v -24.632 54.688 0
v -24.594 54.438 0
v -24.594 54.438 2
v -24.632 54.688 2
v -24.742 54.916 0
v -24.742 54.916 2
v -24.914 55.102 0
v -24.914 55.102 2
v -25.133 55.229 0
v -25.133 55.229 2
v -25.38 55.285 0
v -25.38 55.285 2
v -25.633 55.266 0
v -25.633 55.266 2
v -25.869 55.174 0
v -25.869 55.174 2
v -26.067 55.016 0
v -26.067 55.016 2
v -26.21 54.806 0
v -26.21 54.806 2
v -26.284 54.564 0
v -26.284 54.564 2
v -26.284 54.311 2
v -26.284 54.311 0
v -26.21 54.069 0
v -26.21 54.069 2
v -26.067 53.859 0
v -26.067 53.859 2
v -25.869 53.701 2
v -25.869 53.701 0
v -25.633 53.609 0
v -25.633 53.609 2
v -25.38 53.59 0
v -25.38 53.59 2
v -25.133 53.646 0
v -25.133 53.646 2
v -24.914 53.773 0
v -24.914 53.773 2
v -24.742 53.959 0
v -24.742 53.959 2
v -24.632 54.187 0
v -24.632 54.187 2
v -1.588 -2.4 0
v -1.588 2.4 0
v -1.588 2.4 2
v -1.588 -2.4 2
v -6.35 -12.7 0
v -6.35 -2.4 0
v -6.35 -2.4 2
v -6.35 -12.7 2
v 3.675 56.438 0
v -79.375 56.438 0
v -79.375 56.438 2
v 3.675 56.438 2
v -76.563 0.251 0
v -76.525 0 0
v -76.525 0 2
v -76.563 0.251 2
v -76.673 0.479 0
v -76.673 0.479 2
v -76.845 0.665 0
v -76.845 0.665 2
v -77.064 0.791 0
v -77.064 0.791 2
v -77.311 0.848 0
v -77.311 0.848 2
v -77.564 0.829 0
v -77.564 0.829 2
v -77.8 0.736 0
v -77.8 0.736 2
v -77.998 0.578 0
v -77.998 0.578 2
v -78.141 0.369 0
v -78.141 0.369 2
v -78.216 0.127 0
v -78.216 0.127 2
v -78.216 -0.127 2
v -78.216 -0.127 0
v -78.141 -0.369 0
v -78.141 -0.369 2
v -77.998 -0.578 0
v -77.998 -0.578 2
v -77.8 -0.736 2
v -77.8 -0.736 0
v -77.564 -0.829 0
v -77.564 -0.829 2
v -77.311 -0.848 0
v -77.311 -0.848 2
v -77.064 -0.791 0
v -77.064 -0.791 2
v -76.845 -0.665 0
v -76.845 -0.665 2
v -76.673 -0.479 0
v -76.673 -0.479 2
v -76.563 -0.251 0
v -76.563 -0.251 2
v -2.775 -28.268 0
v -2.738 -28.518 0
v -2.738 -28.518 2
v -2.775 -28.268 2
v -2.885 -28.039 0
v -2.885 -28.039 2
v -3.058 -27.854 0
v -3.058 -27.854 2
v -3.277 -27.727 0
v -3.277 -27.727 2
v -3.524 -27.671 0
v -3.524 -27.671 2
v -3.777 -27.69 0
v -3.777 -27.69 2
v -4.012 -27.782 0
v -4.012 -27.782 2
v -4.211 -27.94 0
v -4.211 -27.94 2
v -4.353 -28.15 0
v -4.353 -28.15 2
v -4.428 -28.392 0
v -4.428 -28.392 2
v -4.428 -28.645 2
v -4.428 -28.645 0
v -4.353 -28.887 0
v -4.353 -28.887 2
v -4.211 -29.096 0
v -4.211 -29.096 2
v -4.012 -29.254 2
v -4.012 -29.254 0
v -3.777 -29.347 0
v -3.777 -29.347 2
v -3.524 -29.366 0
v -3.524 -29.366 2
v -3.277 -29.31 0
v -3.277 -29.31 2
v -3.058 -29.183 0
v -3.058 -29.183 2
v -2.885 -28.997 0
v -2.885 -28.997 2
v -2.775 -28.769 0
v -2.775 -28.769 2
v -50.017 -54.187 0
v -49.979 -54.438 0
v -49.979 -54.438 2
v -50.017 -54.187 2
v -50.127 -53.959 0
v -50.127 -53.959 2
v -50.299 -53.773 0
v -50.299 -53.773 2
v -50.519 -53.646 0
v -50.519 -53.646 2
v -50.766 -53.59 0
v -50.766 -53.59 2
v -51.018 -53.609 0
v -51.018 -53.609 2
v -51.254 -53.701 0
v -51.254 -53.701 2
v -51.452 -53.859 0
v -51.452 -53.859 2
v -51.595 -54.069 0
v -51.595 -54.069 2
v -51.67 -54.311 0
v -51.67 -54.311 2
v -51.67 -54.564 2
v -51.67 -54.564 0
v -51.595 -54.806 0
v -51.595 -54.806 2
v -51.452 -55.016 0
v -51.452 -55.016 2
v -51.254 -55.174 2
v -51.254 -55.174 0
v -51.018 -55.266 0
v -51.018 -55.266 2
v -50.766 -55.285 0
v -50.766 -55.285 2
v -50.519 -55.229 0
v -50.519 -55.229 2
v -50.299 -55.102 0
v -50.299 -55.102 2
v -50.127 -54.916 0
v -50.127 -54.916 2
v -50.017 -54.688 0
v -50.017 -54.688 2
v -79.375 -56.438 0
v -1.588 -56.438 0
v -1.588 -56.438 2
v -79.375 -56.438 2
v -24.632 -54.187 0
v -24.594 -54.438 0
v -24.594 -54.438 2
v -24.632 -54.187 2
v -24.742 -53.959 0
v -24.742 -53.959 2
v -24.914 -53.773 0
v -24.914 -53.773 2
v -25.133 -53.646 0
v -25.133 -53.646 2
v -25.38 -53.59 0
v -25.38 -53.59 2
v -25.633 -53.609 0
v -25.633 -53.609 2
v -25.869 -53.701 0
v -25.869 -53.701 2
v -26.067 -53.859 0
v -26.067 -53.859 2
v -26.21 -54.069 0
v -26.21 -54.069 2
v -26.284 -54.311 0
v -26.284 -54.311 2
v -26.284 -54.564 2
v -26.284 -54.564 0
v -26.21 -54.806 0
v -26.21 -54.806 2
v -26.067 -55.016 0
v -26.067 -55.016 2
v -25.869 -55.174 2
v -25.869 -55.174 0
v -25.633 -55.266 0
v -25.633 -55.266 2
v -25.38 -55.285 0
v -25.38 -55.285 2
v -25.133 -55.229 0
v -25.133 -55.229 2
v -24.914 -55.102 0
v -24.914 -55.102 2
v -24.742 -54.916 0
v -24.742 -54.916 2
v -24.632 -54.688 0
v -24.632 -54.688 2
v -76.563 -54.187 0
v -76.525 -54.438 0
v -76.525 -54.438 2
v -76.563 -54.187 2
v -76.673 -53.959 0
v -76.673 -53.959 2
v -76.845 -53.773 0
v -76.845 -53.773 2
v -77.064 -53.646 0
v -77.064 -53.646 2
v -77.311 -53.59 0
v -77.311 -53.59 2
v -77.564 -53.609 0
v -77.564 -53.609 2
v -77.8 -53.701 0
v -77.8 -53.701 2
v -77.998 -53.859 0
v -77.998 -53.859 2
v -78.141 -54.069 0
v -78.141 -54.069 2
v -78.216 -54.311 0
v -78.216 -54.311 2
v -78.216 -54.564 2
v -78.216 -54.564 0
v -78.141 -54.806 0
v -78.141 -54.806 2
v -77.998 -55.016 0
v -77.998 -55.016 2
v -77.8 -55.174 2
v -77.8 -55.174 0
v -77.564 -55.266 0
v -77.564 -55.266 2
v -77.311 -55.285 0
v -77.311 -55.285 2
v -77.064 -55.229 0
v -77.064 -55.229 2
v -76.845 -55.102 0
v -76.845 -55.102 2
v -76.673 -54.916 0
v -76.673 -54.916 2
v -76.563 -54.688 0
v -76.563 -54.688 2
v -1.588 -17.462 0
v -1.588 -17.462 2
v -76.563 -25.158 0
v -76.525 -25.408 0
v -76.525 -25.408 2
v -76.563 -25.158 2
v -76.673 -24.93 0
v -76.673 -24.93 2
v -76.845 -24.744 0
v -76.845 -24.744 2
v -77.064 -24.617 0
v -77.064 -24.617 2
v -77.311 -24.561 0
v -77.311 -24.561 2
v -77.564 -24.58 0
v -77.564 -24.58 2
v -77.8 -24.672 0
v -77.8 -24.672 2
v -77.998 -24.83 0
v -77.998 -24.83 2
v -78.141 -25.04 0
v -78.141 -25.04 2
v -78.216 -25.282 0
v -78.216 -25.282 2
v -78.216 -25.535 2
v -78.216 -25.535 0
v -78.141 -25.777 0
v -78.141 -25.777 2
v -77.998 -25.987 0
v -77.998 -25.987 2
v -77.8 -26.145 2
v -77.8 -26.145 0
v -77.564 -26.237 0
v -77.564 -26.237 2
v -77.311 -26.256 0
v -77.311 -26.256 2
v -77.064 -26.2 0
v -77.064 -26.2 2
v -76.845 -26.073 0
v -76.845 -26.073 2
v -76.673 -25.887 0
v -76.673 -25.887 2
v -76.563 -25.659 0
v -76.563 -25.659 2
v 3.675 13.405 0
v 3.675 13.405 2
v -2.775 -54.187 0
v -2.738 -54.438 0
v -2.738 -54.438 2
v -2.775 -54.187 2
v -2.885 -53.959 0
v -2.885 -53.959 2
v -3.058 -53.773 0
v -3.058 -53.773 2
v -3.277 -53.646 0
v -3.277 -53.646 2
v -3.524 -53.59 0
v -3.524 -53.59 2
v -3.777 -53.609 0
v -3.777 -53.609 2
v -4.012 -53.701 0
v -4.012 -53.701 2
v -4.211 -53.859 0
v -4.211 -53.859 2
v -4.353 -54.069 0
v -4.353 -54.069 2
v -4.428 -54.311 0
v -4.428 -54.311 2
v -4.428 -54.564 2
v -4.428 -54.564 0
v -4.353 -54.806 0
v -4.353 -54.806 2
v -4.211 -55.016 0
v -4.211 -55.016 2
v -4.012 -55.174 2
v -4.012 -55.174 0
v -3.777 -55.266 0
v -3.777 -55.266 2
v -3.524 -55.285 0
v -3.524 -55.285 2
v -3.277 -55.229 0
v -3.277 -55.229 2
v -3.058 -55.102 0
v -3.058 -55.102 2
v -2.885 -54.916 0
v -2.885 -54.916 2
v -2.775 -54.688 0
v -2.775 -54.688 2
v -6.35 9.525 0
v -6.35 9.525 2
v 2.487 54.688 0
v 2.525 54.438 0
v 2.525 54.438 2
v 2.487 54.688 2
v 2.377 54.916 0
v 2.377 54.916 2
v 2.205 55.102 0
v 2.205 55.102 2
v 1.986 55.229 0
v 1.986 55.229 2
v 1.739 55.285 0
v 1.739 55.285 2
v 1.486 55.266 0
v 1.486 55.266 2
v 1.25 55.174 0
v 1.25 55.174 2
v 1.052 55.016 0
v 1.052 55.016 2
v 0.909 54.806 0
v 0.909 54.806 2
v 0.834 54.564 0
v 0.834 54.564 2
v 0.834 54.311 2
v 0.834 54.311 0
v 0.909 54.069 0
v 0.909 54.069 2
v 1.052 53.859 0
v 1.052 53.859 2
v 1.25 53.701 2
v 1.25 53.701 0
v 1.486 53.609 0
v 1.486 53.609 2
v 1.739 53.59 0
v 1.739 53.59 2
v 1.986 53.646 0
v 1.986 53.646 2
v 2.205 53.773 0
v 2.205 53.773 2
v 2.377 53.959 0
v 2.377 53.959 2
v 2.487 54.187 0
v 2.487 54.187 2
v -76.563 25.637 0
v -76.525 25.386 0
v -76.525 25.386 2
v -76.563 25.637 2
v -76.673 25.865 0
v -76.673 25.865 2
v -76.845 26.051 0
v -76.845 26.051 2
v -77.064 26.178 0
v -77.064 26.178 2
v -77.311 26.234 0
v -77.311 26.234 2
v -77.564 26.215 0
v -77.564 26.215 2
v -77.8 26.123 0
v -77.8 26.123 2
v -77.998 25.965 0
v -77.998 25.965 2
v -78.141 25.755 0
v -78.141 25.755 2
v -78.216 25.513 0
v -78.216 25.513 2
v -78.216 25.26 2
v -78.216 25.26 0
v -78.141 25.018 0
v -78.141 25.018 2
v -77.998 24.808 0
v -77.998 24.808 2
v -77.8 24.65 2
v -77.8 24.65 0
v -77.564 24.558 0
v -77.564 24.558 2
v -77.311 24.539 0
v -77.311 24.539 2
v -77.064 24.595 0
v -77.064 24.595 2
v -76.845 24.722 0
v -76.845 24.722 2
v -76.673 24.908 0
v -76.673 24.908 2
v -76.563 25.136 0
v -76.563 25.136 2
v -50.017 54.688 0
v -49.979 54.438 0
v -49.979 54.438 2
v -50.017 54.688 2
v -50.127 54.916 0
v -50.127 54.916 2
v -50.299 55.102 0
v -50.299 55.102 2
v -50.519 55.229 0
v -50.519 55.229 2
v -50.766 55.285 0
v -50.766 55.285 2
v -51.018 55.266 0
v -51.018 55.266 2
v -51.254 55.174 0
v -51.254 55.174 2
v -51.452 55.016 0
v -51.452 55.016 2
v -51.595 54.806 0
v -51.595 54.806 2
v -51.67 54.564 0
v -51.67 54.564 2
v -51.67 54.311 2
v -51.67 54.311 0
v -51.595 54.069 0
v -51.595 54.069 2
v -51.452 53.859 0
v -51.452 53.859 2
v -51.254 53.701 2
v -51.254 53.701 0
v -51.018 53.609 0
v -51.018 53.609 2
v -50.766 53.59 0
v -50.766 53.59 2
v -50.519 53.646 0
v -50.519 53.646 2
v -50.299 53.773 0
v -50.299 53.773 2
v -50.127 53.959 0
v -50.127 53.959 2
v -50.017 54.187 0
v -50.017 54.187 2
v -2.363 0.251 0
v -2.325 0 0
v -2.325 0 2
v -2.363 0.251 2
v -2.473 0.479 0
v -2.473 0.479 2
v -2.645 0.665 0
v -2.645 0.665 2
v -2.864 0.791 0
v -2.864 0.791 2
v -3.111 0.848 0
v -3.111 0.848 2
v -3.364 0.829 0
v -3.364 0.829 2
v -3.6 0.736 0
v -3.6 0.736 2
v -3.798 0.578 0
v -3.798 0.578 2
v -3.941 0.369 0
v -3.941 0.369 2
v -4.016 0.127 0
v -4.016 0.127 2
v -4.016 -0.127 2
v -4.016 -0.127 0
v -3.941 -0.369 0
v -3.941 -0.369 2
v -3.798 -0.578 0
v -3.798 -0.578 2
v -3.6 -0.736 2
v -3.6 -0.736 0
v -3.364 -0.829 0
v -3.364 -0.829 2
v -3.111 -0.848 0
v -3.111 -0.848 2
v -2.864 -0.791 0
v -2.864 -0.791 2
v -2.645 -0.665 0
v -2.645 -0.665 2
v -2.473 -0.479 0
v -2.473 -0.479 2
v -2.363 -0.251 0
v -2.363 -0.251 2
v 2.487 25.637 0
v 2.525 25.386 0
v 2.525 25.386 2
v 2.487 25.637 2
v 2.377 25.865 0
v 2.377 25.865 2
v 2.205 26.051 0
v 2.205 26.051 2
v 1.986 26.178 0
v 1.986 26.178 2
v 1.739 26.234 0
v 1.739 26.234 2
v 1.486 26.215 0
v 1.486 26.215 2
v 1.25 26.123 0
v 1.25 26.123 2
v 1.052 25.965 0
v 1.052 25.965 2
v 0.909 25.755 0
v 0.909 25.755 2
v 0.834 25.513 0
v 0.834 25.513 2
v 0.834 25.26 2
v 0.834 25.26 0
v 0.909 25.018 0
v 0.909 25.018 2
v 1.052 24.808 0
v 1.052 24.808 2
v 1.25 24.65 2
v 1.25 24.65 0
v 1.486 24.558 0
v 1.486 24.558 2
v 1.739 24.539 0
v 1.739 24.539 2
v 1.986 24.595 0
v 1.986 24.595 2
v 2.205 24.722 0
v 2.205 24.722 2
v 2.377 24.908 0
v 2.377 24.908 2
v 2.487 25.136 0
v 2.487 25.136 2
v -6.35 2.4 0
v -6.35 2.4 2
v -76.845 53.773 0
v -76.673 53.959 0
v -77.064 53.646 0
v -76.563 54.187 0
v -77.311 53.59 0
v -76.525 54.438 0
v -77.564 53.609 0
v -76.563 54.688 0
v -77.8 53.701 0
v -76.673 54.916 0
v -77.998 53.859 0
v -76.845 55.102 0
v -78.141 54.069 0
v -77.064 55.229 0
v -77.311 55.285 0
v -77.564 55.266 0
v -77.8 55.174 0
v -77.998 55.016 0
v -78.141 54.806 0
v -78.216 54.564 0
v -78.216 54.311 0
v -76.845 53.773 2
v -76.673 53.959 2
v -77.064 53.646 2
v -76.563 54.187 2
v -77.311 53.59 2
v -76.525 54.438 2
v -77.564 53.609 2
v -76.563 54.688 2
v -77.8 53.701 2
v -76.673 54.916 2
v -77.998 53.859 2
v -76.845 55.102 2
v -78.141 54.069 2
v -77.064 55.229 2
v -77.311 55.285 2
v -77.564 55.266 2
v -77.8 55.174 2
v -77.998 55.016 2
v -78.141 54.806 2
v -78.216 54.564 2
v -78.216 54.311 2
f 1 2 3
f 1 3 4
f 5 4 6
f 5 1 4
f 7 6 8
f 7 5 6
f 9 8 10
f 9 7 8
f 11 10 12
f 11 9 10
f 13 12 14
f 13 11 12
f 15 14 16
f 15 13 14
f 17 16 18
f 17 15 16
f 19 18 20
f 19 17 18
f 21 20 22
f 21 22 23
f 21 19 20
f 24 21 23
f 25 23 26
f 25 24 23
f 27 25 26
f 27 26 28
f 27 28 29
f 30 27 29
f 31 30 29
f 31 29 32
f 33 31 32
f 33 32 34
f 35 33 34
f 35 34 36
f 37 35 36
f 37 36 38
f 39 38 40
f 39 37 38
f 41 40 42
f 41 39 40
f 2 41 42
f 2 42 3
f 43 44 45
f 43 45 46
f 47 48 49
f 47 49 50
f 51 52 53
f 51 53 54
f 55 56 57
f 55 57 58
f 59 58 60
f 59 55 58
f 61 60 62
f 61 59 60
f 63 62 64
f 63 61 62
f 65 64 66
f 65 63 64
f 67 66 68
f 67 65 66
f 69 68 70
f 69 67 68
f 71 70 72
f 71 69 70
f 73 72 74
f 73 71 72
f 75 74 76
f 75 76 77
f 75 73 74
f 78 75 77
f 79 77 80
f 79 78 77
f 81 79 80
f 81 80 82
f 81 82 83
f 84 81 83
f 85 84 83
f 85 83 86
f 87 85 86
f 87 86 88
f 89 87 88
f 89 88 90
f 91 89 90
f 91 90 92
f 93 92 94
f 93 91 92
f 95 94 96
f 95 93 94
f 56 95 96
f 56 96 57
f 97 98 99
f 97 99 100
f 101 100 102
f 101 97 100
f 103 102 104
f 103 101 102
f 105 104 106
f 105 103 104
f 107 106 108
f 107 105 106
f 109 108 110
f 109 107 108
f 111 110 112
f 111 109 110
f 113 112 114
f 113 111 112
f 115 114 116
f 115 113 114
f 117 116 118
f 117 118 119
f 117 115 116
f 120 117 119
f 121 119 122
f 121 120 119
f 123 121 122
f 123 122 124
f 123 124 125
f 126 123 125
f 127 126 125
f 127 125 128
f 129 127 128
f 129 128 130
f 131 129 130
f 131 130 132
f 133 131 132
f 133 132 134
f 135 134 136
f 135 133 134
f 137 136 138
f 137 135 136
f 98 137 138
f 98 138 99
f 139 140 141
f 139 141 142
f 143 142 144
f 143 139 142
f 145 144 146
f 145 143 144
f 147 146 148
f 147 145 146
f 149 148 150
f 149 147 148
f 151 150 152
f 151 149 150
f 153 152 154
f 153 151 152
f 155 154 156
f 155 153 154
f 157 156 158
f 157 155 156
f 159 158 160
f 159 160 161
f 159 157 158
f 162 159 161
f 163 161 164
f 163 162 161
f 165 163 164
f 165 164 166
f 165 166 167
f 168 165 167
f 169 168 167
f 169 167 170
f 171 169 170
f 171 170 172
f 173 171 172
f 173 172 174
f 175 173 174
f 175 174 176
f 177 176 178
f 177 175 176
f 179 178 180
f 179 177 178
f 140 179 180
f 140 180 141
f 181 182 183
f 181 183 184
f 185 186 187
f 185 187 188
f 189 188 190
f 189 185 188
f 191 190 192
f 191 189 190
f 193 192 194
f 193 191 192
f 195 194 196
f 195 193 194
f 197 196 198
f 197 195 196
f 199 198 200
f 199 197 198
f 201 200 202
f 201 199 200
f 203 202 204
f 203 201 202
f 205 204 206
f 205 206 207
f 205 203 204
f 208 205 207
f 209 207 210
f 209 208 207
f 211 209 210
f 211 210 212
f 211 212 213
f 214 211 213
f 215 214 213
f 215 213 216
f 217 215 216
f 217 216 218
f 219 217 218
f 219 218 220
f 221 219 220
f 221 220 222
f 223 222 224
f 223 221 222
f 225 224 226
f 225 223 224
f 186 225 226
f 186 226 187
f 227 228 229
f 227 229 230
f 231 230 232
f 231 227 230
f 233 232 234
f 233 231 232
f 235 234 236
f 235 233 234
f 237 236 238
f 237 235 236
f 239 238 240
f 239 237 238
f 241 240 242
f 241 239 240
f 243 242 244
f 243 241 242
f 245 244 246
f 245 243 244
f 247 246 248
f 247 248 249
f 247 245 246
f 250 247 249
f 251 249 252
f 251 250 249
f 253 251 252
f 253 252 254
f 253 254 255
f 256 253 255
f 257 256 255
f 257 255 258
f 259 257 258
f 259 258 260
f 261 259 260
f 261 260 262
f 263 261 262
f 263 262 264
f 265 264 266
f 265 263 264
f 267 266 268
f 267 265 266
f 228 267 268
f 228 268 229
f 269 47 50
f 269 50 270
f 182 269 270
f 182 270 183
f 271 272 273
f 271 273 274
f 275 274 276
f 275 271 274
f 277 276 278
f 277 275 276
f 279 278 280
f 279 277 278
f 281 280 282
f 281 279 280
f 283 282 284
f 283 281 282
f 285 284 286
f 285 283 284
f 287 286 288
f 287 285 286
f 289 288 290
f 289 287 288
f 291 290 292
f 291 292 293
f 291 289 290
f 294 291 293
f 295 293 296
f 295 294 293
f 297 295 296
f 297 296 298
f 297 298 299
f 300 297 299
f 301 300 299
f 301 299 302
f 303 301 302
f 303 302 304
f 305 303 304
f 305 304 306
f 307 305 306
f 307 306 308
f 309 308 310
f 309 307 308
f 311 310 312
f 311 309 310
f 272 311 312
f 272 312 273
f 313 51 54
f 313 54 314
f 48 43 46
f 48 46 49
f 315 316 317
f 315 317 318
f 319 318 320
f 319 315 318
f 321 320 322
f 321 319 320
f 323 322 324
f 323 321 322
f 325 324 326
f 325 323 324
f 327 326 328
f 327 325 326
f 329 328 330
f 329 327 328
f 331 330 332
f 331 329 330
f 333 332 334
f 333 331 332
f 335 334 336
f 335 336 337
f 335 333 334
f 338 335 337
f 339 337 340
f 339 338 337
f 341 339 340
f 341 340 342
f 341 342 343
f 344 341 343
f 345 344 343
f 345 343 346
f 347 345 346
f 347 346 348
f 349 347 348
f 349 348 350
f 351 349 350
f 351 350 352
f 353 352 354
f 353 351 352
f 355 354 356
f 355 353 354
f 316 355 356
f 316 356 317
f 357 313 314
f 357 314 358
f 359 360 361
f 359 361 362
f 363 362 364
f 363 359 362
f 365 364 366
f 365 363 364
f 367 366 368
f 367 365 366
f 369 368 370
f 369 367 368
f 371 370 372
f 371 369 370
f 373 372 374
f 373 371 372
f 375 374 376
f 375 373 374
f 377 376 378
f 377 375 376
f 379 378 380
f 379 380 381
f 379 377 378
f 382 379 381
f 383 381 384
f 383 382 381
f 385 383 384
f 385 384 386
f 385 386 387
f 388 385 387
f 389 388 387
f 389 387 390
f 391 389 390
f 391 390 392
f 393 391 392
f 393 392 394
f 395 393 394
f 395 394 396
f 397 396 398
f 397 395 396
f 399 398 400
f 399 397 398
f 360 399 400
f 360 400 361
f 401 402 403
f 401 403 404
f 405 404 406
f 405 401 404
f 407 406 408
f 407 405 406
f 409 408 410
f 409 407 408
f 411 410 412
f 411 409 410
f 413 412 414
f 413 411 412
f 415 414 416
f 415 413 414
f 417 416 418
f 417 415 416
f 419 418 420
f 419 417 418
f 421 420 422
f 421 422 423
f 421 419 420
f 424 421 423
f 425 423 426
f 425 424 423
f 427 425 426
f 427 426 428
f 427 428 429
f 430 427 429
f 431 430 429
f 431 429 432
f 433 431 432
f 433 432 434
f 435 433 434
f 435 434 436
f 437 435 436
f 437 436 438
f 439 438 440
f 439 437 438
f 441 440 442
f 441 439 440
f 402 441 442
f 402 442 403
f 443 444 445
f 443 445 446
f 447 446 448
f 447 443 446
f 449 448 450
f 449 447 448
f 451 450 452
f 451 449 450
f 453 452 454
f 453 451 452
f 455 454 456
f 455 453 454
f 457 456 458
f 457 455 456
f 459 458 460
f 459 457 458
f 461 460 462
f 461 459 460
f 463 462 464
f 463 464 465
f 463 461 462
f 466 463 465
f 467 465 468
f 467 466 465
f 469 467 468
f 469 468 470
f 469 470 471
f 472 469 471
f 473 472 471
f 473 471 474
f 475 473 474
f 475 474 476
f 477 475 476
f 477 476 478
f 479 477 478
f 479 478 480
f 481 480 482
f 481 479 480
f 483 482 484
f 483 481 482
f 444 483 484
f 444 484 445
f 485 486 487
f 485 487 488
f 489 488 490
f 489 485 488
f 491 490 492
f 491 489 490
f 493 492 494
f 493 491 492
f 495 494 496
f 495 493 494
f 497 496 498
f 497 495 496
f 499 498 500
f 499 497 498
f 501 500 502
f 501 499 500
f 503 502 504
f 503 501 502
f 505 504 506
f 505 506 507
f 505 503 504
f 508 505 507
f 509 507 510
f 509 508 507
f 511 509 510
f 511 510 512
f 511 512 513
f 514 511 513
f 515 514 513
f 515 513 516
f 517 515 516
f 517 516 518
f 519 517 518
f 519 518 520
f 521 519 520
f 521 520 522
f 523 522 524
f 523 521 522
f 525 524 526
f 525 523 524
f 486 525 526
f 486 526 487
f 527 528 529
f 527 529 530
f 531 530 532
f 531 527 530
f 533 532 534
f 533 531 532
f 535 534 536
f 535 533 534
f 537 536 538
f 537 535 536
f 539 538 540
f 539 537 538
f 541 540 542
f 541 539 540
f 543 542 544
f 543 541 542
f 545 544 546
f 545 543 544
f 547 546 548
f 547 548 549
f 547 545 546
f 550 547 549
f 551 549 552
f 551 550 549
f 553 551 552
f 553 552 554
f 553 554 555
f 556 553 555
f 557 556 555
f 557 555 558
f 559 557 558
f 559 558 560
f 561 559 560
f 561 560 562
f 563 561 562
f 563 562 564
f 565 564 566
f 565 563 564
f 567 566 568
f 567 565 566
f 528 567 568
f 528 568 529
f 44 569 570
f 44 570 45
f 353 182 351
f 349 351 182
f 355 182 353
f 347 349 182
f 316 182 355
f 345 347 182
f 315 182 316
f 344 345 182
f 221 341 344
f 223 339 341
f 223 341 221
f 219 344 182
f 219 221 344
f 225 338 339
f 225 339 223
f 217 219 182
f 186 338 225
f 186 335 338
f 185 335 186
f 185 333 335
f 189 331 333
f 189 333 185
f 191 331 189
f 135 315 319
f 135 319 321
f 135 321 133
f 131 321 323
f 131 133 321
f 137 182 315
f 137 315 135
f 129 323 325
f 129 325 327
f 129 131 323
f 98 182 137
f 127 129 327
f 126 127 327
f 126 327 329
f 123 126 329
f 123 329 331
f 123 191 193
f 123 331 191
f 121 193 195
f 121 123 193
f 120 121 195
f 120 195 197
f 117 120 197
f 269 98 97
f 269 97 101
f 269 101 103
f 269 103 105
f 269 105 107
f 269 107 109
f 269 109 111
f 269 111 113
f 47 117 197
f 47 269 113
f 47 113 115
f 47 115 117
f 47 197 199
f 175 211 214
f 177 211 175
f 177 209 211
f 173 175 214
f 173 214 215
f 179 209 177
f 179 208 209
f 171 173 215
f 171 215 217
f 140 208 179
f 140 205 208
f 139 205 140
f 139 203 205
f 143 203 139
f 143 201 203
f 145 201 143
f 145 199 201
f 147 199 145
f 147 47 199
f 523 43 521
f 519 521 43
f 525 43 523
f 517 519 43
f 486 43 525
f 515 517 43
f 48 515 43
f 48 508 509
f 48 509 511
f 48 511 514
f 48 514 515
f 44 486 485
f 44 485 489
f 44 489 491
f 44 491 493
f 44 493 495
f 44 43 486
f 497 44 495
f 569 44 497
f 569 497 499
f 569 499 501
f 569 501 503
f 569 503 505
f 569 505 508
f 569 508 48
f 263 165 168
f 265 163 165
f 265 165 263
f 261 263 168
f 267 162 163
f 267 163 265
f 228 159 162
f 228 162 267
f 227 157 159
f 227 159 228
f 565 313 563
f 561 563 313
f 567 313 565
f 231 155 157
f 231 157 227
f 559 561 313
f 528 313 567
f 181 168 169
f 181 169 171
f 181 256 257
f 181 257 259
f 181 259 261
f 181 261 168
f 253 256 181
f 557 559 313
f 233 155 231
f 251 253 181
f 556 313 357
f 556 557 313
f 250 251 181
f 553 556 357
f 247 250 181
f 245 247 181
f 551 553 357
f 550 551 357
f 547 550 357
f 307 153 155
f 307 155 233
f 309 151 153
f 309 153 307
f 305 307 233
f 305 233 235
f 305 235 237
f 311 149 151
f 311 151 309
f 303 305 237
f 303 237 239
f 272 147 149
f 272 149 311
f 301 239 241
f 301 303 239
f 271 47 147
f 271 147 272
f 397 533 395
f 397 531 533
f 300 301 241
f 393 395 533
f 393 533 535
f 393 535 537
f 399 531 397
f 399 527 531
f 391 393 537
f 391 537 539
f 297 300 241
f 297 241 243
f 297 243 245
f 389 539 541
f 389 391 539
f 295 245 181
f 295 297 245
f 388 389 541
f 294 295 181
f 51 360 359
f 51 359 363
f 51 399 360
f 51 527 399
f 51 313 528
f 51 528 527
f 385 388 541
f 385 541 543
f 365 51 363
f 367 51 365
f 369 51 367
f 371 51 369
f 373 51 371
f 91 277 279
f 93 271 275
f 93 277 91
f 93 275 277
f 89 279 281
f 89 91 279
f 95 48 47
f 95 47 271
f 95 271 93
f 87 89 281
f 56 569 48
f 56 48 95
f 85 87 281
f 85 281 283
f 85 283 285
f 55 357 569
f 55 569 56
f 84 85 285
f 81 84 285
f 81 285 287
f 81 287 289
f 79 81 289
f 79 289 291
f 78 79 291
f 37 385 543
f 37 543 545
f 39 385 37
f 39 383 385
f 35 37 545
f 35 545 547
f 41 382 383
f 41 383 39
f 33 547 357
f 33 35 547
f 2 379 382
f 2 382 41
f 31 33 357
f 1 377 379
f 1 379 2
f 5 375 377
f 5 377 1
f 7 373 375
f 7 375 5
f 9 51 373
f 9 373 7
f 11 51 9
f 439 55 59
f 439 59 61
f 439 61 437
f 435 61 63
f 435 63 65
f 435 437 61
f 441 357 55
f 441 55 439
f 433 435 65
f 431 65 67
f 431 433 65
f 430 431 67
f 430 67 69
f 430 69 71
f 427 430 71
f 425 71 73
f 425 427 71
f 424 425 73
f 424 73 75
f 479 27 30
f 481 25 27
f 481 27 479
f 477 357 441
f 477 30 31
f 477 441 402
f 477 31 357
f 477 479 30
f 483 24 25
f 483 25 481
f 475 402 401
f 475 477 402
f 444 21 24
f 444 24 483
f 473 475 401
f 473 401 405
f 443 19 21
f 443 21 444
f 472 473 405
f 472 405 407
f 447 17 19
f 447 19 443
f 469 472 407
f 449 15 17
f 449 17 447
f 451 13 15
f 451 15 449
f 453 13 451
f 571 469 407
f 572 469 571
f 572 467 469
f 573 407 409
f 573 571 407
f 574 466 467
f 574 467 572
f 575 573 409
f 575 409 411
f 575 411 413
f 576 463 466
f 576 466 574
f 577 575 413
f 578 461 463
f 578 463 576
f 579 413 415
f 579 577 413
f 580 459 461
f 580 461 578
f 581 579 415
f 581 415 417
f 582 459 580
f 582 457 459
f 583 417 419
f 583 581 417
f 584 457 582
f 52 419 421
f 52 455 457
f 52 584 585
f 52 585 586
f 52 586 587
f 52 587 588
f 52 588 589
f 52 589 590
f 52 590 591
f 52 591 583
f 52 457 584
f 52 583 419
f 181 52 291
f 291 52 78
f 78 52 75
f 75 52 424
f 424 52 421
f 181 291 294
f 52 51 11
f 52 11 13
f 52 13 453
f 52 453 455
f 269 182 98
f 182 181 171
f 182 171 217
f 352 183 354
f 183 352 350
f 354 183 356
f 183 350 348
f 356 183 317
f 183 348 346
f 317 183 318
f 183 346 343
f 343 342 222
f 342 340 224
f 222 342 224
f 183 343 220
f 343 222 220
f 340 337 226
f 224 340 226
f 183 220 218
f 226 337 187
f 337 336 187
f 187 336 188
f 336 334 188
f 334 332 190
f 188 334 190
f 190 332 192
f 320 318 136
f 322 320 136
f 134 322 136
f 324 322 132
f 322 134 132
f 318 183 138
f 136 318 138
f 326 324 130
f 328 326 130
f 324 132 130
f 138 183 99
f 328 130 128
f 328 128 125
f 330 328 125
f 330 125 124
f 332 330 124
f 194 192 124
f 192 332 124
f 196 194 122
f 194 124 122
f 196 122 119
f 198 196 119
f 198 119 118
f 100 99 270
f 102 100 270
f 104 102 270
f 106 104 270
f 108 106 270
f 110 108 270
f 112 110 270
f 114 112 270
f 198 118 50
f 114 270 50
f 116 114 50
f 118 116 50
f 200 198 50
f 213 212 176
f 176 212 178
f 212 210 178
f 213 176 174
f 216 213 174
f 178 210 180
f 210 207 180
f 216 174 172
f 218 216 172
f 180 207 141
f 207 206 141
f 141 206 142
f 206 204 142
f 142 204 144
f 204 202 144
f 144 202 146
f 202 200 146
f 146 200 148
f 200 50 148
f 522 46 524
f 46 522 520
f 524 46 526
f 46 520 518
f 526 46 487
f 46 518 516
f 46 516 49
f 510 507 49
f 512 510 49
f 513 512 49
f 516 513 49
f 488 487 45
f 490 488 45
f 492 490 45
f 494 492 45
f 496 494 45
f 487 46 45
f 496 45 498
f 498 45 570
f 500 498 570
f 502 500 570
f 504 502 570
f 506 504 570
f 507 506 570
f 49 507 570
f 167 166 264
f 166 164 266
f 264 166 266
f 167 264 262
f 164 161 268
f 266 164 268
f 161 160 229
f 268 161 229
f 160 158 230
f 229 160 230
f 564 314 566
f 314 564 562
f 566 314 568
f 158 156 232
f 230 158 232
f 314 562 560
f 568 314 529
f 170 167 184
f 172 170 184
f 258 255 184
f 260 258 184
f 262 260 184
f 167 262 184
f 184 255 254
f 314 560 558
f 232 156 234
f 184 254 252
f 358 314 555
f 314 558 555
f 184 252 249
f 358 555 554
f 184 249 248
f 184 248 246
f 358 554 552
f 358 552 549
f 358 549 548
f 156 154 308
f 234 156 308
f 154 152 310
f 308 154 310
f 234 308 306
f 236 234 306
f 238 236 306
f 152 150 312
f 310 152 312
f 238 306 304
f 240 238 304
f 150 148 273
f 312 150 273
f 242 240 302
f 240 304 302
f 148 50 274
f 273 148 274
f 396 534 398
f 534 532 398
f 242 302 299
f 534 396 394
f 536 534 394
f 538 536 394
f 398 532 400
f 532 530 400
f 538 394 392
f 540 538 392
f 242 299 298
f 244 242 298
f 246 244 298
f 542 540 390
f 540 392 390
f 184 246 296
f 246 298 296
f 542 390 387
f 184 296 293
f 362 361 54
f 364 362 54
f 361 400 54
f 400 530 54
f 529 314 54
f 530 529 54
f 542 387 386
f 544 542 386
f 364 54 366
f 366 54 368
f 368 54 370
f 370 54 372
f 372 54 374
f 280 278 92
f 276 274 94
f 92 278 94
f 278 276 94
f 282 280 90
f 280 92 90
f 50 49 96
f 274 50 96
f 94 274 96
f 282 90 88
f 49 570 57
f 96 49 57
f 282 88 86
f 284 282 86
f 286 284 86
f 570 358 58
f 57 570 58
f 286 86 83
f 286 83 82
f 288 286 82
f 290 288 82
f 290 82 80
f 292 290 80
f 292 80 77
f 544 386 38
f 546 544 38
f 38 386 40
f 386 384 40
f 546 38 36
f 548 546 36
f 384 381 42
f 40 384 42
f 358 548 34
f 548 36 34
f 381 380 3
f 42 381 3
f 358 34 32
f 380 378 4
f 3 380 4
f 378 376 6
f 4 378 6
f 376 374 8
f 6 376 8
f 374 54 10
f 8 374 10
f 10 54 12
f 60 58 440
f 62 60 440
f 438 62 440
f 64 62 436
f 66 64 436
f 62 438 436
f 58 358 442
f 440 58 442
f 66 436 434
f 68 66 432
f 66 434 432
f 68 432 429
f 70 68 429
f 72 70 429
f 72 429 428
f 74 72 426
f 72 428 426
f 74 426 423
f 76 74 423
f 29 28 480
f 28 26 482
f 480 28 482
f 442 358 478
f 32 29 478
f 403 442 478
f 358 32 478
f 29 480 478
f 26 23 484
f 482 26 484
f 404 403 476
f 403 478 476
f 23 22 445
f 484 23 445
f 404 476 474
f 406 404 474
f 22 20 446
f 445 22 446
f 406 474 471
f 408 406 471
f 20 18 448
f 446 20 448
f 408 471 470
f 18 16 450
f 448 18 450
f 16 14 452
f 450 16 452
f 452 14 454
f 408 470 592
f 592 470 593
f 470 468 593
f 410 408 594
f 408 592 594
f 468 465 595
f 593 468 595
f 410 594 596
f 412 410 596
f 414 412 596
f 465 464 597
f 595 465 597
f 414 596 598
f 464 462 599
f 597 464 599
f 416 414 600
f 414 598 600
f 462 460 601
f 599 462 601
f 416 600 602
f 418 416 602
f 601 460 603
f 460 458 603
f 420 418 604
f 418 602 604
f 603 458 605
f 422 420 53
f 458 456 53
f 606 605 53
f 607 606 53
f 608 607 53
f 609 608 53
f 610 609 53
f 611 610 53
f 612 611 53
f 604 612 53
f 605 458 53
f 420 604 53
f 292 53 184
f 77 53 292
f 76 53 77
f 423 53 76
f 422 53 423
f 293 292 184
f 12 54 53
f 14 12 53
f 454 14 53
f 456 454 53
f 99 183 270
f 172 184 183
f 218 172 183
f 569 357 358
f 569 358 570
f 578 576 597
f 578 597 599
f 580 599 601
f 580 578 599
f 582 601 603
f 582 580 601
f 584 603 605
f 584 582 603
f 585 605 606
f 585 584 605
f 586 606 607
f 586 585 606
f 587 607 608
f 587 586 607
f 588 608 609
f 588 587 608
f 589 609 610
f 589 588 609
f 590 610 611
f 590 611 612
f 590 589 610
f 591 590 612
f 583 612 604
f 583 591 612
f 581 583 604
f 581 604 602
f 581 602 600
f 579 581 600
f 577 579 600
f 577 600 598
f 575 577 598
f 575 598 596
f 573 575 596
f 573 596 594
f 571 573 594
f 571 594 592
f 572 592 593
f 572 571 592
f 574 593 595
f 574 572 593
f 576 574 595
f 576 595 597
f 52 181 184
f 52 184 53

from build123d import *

# Parameters (mm, degrees)
SKETCH1_R      = 0.85
EXTRUDE1_DEPTH = 2


with BuildPart() as part:
    # Sketch1 → Extrude1 (new body)
    with BuildSketch(Plane.XY):
        Polygon((-79.375, -56.4375), (-79.375, 56.4375), (3.675, 56.4375), (3.675, 13.405219977), (-6.35, 9.525), (-6.35, 2.4), (-1.5875, 2.4), (-1.5875, -2.4), (-6.35, -2.4), (-6.35, -12.7), (-1.5875, -17.4625), (-1.5875, -56.4375), align=None)
        with Locations((-3.175, 0)):
            Circle(SKETCH1_R, mode=Mode.SUBTRACT)
        with Locations((1.675, 54.4375)):
            Circle(SKETCH1_R, mode=Mode.SUBTRACT)
        with Locations((-25.443833121, 54.4375)):
            Circle(SKETCH1_R, mode=Mode.SUBTRACT)
        with Locations((-50.829063022, 54.4375)):
            Circle(SKETCH1_R, mode=Mode.SUBTRACT)
        with Locations((-77.375, 54.4375)):
            Circle(SKETCH1_R, mode=Mode.SUBTRACT)
        with Locations((-77.375, 25.386437646)):
            Circle(SKETCH1_R, mode=Mode.SUBTRACT)
        with Locations((-77.375, 0)):
            Circle(SKETCH1_R, mode=Mode.SUBTRACT)
        with Locations((-77.375, -25.408441217)):
            Circle(SKETCH1_R, mode=Mode.SUBTRACT)
        with Locations((-77.375, -54.4375)):
            Circle(SKETCH1_R, mode=Mode.SUBTRACT)
        with Locations((-50.829063022, -54.4375)):
            Circle(SKETCH1_R, mode=Mode.SUBTRACT)
        with Locations((-25.443833121, -54.4375)):
            Circle(SKETCH1_R, mode=Mode.SUBTRACT)
        with Locations((-3.5875, -54.4375)):
            Circle(SKETCH1_R, mode=Mode.SUBTRACT)
        with Locations((-3.5875, -28.51830741)):
            Circle(SKETCH1_R, mode=Mode.SUBTRACT)
        with Locations((1.675, 25.386437646)):
            Circle(SKETCH1_R, mode=Mode.SUBTRACT)
    extrude(amount=EXTRUDE1_DEPTH)


solid = part.part
